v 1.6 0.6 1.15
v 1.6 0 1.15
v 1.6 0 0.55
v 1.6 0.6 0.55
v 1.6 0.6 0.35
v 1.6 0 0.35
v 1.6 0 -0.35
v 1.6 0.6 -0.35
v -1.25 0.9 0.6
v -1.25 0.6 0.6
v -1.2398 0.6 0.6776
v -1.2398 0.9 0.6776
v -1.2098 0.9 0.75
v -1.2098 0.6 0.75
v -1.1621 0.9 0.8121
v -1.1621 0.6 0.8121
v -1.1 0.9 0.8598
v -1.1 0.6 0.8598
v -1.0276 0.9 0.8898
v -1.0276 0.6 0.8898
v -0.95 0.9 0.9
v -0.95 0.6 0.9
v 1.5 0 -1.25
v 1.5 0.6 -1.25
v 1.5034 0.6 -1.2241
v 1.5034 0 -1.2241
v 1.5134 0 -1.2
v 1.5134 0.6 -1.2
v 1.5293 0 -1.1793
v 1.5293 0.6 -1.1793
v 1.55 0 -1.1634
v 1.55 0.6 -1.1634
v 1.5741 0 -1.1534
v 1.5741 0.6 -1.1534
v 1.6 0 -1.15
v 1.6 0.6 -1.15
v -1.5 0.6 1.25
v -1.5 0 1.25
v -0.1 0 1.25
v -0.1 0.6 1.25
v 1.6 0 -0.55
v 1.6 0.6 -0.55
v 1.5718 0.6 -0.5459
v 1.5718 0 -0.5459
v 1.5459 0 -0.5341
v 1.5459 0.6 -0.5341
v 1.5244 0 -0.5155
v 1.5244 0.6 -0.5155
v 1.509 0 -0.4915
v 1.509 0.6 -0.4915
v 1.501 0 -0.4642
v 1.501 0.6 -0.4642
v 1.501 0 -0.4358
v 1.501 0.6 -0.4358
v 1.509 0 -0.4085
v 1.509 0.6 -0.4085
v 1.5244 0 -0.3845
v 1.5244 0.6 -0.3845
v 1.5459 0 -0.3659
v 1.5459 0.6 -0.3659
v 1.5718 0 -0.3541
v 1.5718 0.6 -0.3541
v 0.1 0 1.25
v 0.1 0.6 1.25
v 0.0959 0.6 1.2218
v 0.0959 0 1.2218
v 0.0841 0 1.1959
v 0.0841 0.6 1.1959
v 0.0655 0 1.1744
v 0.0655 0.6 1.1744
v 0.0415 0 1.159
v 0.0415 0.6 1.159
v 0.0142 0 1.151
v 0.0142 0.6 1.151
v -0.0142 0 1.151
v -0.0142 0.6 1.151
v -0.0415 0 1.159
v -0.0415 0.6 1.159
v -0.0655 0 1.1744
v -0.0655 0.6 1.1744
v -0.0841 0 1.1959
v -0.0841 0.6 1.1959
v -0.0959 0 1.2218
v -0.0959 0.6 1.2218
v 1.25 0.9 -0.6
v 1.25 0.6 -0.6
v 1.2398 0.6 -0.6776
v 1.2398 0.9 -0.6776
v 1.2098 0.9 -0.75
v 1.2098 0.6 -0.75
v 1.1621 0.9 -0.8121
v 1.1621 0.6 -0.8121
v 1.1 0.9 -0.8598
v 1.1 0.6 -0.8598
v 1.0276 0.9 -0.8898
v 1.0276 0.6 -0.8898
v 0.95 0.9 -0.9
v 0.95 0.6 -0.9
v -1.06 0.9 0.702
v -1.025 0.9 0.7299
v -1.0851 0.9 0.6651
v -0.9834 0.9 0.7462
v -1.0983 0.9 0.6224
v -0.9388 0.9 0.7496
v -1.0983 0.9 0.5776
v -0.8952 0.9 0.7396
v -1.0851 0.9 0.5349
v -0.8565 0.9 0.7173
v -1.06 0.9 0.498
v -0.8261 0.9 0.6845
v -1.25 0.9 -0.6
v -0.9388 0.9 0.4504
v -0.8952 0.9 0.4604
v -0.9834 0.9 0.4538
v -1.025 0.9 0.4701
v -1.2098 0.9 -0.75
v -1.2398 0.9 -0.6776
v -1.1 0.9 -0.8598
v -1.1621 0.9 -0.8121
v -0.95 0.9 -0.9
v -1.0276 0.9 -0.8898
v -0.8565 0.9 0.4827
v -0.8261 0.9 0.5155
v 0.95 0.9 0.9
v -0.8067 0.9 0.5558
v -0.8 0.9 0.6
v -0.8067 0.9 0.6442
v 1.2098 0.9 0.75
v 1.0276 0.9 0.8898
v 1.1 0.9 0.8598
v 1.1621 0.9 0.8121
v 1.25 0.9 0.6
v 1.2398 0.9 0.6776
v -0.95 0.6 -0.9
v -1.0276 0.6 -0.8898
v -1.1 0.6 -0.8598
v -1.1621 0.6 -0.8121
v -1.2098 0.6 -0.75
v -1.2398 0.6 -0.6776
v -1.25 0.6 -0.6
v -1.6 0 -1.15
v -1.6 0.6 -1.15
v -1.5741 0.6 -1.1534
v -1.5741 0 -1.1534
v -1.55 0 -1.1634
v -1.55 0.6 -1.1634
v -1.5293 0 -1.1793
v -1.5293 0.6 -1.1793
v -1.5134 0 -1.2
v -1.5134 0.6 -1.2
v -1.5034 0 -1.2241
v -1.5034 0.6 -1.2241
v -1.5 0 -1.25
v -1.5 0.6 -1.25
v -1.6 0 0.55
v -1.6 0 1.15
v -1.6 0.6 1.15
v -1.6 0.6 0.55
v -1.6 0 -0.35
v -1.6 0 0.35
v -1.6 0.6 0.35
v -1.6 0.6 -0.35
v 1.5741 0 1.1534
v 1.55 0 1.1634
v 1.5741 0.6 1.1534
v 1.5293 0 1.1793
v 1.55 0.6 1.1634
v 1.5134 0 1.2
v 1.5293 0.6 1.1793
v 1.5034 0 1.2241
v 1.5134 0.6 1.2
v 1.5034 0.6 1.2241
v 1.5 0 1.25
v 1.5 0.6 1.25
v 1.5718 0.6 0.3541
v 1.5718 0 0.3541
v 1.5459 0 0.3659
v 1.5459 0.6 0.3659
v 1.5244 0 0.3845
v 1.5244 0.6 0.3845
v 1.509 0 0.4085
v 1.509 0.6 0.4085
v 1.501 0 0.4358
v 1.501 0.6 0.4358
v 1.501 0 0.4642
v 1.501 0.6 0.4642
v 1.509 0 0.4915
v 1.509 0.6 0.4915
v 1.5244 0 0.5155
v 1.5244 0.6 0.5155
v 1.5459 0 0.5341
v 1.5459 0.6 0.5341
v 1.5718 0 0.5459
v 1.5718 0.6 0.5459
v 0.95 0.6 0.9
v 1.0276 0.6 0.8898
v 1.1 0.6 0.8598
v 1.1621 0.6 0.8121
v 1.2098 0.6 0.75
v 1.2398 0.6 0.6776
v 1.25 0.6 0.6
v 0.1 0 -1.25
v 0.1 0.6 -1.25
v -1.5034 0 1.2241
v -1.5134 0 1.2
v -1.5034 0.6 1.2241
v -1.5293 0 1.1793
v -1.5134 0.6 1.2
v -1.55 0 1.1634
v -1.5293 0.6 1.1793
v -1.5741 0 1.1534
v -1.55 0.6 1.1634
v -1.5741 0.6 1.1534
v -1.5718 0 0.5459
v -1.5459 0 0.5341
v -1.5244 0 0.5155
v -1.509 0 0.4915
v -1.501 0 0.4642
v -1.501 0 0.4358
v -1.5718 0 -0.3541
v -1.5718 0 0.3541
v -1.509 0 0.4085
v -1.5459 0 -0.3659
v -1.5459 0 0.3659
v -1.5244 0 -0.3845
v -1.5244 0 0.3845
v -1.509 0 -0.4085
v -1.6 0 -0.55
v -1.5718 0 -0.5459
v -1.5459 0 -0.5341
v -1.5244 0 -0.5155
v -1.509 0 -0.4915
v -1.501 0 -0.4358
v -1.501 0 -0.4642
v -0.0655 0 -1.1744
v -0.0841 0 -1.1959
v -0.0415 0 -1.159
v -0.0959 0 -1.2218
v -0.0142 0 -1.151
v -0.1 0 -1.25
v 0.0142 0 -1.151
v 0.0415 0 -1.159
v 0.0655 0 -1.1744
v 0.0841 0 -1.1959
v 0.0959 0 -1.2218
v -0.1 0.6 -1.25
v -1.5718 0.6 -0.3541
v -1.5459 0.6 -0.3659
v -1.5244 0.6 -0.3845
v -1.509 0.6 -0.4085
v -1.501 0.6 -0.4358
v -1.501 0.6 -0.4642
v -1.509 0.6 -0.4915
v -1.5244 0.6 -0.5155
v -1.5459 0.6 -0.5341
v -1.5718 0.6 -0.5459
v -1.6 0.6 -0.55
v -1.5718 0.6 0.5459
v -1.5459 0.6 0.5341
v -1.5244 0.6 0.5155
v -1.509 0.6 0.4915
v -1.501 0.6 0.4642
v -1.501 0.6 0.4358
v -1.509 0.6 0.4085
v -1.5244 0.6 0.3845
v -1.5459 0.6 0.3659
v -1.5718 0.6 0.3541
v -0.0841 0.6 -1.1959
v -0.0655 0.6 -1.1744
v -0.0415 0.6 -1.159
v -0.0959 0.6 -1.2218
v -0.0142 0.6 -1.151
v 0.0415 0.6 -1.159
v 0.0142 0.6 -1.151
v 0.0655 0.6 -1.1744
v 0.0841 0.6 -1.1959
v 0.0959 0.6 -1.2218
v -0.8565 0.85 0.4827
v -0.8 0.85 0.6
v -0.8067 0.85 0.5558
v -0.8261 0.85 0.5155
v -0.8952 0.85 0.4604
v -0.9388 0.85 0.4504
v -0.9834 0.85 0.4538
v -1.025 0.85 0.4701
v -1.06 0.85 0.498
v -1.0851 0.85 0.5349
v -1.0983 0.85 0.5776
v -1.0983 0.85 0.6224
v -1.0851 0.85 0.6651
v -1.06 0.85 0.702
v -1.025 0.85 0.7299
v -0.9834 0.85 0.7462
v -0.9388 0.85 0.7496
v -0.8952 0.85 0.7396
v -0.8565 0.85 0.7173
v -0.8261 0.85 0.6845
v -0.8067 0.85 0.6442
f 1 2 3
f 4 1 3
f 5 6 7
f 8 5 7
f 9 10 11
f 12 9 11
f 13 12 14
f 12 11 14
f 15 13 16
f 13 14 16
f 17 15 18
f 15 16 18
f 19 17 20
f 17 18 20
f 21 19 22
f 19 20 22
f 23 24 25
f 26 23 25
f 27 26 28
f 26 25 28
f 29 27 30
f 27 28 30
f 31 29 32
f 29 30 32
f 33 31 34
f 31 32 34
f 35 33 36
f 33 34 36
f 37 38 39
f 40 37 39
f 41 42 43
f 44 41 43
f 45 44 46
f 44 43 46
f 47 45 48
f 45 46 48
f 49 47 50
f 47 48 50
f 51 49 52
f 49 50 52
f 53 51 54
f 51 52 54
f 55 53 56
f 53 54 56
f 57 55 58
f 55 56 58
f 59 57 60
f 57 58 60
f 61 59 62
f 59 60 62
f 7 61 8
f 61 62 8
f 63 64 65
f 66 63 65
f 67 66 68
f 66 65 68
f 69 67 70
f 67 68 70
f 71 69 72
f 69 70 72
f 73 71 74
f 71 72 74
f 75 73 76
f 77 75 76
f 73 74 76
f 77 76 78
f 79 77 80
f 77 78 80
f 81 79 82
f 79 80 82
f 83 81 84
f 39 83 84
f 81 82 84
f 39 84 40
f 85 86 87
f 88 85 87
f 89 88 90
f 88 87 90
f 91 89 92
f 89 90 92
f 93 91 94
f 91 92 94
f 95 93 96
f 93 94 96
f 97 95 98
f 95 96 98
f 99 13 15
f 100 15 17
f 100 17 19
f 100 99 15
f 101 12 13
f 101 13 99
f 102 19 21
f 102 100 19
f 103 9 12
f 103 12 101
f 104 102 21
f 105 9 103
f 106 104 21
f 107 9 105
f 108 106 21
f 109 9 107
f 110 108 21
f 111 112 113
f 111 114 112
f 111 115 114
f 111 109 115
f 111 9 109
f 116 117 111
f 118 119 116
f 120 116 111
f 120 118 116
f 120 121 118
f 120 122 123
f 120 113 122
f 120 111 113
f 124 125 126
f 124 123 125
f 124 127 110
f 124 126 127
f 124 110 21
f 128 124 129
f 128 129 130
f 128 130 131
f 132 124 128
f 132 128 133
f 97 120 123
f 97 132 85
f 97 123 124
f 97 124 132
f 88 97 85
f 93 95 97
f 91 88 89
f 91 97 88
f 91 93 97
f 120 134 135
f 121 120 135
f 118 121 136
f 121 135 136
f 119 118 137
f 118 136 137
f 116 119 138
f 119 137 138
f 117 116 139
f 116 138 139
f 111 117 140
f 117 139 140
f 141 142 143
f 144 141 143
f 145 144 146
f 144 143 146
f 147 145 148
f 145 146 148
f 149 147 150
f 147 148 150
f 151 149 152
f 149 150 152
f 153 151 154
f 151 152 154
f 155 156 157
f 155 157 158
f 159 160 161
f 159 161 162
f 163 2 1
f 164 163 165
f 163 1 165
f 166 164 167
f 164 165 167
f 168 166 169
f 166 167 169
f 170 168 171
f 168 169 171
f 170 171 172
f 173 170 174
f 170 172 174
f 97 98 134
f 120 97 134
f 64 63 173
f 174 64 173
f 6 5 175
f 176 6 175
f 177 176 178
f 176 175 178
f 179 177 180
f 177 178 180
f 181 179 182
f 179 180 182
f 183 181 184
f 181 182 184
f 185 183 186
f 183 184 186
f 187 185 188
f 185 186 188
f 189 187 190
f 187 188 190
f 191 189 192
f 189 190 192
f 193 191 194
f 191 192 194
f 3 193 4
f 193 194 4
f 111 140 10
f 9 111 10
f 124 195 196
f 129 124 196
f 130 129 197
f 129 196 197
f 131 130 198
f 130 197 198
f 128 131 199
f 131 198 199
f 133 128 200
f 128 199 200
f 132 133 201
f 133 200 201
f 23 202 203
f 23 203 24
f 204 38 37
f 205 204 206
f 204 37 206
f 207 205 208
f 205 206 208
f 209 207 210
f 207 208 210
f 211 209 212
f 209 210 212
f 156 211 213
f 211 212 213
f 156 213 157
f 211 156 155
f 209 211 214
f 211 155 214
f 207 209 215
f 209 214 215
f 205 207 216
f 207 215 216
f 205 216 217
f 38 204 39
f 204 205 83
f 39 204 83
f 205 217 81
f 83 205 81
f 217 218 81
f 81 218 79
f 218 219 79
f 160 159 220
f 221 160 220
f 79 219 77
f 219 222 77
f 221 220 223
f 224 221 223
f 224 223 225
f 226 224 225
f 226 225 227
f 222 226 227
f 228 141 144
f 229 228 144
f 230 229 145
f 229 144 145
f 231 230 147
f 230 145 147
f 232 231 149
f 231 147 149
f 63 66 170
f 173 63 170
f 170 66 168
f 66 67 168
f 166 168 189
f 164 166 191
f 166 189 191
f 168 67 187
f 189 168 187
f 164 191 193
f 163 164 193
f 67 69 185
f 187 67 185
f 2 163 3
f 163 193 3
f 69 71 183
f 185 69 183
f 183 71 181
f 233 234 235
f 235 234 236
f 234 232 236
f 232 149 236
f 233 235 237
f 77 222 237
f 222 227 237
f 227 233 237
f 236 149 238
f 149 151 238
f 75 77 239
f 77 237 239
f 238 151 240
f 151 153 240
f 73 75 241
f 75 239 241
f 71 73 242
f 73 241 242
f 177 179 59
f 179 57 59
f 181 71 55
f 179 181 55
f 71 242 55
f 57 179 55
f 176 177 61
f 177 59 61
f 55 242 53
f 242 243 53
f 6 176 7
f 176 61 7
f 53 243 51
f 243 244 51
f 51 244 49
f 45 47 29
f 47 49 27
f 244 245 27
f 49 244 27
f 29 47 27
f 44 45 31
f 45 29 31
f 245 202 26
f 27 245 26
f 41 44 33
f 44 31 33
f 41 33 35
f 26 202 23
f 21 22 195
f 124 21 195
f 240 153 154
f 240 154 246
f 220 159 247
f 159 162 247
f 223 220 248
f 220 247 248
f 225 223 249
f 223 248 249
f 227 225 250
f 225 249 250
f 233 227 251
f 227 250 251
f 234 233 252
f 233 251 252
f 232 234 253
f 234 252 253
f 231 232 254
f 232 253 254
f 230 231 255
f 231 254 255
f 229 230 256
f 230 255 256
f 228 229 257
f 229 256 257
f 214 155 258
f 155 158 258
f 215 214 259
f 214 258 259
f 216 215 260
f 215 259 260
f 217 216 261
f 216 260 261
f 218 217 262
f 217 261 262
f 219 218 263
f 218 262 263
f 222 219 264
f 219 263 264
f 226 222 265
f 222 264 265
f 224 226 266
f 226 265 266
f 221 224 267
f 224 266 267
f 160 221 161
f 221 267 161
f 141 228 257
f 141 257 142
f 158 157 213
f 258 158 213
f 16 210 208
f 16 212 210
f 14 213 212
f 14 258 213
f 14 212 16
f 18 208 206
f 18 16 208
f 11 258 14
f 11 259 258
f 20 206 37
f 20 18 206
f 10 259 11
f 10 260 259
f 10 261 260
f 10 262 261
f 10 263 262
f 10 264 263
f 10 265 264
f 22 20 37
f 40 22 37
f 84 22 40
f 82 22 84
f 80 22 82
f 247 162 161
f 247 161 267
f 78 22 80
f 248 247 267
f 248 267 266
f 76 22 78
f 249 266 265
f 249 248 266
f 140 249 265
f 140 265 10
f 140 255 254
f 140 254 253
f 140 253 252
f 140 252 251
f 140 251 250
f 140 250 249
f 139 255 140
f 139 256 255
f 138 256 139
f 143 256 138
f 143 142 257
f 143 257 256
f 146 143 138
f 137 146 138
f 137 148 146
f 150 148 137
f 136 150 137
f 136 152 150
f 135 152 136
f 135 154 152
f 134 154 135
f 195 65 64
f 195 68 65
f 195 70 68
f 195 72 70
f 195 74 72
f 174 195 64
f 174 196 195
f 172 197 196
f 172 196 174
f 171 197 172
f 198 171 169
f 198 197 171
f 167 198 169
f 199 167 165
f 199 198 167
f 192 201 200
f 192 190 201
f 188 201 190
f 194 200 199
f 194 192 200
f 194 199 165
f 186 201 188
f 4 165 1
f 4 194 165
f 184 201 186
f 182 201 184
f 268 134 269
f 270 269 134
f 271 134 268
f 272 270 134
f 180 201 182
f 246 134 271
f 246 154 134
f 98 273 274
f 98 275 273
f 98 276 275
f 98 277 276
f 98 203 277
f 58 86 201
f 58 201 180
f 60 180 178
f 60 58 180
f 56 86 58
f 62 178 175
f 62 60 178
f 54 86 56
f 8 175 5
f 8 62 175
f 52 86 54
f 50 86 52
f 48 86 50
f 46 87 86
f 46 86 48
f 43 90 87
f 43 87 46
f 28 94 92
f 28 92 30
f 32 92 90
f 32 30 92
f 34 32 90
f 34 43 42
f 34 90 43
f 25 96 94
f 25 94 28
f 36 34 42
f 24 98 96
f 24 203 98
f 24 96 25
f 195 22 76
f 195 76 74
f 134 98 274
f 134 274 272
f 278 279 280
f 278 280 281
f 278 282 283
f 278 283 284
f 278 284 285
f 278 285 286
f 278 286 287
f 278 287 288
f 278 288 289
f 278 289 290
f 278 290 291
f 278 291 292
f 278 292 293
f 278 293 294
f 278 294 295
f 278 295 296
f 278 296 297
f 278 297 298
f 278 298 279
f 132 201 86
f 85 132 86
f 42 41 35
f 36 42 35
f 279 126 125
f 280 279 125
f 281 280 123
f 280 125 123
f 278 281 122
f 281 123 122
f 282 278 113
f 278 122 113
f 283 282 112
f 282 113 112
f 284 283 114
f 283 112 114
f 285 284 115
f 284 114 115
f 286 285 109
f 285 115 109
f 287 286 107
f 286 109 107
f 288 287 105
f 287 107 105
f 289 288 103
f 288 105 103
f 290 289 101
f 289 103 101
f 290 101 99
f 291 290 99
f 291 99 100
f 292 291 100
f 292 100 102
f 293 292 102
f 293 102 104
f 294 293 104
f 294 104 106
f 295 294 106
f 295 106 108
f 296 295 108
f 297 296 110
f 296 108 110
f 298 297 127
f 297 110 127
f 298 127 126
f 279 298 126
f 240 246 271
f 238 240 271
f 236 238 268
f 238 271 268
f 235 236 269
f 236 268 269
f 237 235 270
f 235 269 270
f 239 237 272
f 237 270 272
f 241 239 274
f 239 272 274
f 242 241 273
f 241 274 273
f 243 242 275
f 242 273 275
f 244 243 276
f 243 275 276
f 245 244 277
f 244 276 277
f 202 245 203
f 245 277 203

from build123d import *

# Parameters (mm, degrees)
SKETCH1_W           = 3.2
SKETCH1_H           = 2.5
BOSS_EXTRUDE1_DEPTH = 0.6
BOSS_EXTRUDE2_DEPTH = 0.3
SKETCH3_R           = 0.1
CUT_EXTRUDE1_DEPTH  = 1.6
SKETCH4_R           = 0.15
CUT_EXTRUDE2_DEPTH  = 0.05


with BuildPart() as part:
    # Sketch1 → Boss-Extrude1 (new body)
    with BuildSketch(Plane(origin=(0, 0, 0), x_dir=(1, 0, 0), z_dir=(0, 1, 0))):
        Rectangle(SKETCH1_W, SKETCH1_H)
    extrude(amount=BOSS_EXTRUDE1_DEPTH)

    # Sketch2 → Boss-Extrude2 (add)
    with BuildSketch(Plane(origin=(0, 0.6, 0), x_dir=(1, 0, 0), z_dir=(0, 1, 0))):
        with BuildLine():
            Line((-0.95, -0.9), (0.95, -0.9))
            ThreePointArc((0.95, -0.9), (1.162132034, -0.812132034), (1.25, -0.6))
            Line((1.25, -0.6), (1.25, 0.6))
            ThreePointArc((1.25, 0.6), (1.162132034, 0.812132034), (0.95, 0.9))
            Line((0.95, 0.9), (-0.95, 0.9))
            ThreePointArc((-0.95, 0.9), (-1.162132034, 0.812132034), (-1.25, 0.6))
            Line((-1.25, 0.6), (-1.25, -0.6))
            ThreePointArc((-1.25, -0.6), (-1.162132034, -0.812132034), (-0.95, -0.9))
        make_face()
    extrude(amount=BOSS_EXTRUDE2_DEPTH)

    # Sketch3 → Cut-Extrude1 (cut, through all)
    with BuildSketch(Plane(origin=(0, 0.6, 0), x_dir=(1, 0, 0), z_dir=(0, 1, 0))):
        with Locations((-1.6, 1.25)):
            Circle(SKETCH3_R)
        with Locations((0, 1.25)):
            Circle(SKETCH3_R)
        with Locations((1.6, 1.25)):
            Circle(SKETCH3_R)
        with Locations((0, -1.25)):
            Circle(SKETCH3_R)
        with Locations((-1.6, -1.25)):
            Circle(SKETCH3_R)
        with Locations((1.6, -1.25)):
            Circle(SKETCH3_R)
        with Locations((-1.6, 0.45)):
            Circle(SKETCH3_R)
        with Locations((-1.6, -0.45)):
            Circle(SKETCH3_R)
        with Locations((1.6, -0.45)):
            Circle(SKETCH3_R)
        with Locations((1.6, 0.45)):
            Circle(SKETCH3_R)
    extrude(amount=-CUT_EXTRUDE1_DEPTH, mode=Mode.SUBTRACT)

    # Sketch4 → Cut-Extrude2 (cut)
    with BuildSketch(Plane(origin=(0, 0.9, 0), x_dir=(1, 0, 0), z_dir=(0, 1, 0))):
        with Locations((-0.95, -0.6)):
            Circle(SKETCH4_R)
    extrude(amount=-CUT_EXTRUDE2_DEPTH, mode=Mode.SUBTRACT)


solid = part.part
